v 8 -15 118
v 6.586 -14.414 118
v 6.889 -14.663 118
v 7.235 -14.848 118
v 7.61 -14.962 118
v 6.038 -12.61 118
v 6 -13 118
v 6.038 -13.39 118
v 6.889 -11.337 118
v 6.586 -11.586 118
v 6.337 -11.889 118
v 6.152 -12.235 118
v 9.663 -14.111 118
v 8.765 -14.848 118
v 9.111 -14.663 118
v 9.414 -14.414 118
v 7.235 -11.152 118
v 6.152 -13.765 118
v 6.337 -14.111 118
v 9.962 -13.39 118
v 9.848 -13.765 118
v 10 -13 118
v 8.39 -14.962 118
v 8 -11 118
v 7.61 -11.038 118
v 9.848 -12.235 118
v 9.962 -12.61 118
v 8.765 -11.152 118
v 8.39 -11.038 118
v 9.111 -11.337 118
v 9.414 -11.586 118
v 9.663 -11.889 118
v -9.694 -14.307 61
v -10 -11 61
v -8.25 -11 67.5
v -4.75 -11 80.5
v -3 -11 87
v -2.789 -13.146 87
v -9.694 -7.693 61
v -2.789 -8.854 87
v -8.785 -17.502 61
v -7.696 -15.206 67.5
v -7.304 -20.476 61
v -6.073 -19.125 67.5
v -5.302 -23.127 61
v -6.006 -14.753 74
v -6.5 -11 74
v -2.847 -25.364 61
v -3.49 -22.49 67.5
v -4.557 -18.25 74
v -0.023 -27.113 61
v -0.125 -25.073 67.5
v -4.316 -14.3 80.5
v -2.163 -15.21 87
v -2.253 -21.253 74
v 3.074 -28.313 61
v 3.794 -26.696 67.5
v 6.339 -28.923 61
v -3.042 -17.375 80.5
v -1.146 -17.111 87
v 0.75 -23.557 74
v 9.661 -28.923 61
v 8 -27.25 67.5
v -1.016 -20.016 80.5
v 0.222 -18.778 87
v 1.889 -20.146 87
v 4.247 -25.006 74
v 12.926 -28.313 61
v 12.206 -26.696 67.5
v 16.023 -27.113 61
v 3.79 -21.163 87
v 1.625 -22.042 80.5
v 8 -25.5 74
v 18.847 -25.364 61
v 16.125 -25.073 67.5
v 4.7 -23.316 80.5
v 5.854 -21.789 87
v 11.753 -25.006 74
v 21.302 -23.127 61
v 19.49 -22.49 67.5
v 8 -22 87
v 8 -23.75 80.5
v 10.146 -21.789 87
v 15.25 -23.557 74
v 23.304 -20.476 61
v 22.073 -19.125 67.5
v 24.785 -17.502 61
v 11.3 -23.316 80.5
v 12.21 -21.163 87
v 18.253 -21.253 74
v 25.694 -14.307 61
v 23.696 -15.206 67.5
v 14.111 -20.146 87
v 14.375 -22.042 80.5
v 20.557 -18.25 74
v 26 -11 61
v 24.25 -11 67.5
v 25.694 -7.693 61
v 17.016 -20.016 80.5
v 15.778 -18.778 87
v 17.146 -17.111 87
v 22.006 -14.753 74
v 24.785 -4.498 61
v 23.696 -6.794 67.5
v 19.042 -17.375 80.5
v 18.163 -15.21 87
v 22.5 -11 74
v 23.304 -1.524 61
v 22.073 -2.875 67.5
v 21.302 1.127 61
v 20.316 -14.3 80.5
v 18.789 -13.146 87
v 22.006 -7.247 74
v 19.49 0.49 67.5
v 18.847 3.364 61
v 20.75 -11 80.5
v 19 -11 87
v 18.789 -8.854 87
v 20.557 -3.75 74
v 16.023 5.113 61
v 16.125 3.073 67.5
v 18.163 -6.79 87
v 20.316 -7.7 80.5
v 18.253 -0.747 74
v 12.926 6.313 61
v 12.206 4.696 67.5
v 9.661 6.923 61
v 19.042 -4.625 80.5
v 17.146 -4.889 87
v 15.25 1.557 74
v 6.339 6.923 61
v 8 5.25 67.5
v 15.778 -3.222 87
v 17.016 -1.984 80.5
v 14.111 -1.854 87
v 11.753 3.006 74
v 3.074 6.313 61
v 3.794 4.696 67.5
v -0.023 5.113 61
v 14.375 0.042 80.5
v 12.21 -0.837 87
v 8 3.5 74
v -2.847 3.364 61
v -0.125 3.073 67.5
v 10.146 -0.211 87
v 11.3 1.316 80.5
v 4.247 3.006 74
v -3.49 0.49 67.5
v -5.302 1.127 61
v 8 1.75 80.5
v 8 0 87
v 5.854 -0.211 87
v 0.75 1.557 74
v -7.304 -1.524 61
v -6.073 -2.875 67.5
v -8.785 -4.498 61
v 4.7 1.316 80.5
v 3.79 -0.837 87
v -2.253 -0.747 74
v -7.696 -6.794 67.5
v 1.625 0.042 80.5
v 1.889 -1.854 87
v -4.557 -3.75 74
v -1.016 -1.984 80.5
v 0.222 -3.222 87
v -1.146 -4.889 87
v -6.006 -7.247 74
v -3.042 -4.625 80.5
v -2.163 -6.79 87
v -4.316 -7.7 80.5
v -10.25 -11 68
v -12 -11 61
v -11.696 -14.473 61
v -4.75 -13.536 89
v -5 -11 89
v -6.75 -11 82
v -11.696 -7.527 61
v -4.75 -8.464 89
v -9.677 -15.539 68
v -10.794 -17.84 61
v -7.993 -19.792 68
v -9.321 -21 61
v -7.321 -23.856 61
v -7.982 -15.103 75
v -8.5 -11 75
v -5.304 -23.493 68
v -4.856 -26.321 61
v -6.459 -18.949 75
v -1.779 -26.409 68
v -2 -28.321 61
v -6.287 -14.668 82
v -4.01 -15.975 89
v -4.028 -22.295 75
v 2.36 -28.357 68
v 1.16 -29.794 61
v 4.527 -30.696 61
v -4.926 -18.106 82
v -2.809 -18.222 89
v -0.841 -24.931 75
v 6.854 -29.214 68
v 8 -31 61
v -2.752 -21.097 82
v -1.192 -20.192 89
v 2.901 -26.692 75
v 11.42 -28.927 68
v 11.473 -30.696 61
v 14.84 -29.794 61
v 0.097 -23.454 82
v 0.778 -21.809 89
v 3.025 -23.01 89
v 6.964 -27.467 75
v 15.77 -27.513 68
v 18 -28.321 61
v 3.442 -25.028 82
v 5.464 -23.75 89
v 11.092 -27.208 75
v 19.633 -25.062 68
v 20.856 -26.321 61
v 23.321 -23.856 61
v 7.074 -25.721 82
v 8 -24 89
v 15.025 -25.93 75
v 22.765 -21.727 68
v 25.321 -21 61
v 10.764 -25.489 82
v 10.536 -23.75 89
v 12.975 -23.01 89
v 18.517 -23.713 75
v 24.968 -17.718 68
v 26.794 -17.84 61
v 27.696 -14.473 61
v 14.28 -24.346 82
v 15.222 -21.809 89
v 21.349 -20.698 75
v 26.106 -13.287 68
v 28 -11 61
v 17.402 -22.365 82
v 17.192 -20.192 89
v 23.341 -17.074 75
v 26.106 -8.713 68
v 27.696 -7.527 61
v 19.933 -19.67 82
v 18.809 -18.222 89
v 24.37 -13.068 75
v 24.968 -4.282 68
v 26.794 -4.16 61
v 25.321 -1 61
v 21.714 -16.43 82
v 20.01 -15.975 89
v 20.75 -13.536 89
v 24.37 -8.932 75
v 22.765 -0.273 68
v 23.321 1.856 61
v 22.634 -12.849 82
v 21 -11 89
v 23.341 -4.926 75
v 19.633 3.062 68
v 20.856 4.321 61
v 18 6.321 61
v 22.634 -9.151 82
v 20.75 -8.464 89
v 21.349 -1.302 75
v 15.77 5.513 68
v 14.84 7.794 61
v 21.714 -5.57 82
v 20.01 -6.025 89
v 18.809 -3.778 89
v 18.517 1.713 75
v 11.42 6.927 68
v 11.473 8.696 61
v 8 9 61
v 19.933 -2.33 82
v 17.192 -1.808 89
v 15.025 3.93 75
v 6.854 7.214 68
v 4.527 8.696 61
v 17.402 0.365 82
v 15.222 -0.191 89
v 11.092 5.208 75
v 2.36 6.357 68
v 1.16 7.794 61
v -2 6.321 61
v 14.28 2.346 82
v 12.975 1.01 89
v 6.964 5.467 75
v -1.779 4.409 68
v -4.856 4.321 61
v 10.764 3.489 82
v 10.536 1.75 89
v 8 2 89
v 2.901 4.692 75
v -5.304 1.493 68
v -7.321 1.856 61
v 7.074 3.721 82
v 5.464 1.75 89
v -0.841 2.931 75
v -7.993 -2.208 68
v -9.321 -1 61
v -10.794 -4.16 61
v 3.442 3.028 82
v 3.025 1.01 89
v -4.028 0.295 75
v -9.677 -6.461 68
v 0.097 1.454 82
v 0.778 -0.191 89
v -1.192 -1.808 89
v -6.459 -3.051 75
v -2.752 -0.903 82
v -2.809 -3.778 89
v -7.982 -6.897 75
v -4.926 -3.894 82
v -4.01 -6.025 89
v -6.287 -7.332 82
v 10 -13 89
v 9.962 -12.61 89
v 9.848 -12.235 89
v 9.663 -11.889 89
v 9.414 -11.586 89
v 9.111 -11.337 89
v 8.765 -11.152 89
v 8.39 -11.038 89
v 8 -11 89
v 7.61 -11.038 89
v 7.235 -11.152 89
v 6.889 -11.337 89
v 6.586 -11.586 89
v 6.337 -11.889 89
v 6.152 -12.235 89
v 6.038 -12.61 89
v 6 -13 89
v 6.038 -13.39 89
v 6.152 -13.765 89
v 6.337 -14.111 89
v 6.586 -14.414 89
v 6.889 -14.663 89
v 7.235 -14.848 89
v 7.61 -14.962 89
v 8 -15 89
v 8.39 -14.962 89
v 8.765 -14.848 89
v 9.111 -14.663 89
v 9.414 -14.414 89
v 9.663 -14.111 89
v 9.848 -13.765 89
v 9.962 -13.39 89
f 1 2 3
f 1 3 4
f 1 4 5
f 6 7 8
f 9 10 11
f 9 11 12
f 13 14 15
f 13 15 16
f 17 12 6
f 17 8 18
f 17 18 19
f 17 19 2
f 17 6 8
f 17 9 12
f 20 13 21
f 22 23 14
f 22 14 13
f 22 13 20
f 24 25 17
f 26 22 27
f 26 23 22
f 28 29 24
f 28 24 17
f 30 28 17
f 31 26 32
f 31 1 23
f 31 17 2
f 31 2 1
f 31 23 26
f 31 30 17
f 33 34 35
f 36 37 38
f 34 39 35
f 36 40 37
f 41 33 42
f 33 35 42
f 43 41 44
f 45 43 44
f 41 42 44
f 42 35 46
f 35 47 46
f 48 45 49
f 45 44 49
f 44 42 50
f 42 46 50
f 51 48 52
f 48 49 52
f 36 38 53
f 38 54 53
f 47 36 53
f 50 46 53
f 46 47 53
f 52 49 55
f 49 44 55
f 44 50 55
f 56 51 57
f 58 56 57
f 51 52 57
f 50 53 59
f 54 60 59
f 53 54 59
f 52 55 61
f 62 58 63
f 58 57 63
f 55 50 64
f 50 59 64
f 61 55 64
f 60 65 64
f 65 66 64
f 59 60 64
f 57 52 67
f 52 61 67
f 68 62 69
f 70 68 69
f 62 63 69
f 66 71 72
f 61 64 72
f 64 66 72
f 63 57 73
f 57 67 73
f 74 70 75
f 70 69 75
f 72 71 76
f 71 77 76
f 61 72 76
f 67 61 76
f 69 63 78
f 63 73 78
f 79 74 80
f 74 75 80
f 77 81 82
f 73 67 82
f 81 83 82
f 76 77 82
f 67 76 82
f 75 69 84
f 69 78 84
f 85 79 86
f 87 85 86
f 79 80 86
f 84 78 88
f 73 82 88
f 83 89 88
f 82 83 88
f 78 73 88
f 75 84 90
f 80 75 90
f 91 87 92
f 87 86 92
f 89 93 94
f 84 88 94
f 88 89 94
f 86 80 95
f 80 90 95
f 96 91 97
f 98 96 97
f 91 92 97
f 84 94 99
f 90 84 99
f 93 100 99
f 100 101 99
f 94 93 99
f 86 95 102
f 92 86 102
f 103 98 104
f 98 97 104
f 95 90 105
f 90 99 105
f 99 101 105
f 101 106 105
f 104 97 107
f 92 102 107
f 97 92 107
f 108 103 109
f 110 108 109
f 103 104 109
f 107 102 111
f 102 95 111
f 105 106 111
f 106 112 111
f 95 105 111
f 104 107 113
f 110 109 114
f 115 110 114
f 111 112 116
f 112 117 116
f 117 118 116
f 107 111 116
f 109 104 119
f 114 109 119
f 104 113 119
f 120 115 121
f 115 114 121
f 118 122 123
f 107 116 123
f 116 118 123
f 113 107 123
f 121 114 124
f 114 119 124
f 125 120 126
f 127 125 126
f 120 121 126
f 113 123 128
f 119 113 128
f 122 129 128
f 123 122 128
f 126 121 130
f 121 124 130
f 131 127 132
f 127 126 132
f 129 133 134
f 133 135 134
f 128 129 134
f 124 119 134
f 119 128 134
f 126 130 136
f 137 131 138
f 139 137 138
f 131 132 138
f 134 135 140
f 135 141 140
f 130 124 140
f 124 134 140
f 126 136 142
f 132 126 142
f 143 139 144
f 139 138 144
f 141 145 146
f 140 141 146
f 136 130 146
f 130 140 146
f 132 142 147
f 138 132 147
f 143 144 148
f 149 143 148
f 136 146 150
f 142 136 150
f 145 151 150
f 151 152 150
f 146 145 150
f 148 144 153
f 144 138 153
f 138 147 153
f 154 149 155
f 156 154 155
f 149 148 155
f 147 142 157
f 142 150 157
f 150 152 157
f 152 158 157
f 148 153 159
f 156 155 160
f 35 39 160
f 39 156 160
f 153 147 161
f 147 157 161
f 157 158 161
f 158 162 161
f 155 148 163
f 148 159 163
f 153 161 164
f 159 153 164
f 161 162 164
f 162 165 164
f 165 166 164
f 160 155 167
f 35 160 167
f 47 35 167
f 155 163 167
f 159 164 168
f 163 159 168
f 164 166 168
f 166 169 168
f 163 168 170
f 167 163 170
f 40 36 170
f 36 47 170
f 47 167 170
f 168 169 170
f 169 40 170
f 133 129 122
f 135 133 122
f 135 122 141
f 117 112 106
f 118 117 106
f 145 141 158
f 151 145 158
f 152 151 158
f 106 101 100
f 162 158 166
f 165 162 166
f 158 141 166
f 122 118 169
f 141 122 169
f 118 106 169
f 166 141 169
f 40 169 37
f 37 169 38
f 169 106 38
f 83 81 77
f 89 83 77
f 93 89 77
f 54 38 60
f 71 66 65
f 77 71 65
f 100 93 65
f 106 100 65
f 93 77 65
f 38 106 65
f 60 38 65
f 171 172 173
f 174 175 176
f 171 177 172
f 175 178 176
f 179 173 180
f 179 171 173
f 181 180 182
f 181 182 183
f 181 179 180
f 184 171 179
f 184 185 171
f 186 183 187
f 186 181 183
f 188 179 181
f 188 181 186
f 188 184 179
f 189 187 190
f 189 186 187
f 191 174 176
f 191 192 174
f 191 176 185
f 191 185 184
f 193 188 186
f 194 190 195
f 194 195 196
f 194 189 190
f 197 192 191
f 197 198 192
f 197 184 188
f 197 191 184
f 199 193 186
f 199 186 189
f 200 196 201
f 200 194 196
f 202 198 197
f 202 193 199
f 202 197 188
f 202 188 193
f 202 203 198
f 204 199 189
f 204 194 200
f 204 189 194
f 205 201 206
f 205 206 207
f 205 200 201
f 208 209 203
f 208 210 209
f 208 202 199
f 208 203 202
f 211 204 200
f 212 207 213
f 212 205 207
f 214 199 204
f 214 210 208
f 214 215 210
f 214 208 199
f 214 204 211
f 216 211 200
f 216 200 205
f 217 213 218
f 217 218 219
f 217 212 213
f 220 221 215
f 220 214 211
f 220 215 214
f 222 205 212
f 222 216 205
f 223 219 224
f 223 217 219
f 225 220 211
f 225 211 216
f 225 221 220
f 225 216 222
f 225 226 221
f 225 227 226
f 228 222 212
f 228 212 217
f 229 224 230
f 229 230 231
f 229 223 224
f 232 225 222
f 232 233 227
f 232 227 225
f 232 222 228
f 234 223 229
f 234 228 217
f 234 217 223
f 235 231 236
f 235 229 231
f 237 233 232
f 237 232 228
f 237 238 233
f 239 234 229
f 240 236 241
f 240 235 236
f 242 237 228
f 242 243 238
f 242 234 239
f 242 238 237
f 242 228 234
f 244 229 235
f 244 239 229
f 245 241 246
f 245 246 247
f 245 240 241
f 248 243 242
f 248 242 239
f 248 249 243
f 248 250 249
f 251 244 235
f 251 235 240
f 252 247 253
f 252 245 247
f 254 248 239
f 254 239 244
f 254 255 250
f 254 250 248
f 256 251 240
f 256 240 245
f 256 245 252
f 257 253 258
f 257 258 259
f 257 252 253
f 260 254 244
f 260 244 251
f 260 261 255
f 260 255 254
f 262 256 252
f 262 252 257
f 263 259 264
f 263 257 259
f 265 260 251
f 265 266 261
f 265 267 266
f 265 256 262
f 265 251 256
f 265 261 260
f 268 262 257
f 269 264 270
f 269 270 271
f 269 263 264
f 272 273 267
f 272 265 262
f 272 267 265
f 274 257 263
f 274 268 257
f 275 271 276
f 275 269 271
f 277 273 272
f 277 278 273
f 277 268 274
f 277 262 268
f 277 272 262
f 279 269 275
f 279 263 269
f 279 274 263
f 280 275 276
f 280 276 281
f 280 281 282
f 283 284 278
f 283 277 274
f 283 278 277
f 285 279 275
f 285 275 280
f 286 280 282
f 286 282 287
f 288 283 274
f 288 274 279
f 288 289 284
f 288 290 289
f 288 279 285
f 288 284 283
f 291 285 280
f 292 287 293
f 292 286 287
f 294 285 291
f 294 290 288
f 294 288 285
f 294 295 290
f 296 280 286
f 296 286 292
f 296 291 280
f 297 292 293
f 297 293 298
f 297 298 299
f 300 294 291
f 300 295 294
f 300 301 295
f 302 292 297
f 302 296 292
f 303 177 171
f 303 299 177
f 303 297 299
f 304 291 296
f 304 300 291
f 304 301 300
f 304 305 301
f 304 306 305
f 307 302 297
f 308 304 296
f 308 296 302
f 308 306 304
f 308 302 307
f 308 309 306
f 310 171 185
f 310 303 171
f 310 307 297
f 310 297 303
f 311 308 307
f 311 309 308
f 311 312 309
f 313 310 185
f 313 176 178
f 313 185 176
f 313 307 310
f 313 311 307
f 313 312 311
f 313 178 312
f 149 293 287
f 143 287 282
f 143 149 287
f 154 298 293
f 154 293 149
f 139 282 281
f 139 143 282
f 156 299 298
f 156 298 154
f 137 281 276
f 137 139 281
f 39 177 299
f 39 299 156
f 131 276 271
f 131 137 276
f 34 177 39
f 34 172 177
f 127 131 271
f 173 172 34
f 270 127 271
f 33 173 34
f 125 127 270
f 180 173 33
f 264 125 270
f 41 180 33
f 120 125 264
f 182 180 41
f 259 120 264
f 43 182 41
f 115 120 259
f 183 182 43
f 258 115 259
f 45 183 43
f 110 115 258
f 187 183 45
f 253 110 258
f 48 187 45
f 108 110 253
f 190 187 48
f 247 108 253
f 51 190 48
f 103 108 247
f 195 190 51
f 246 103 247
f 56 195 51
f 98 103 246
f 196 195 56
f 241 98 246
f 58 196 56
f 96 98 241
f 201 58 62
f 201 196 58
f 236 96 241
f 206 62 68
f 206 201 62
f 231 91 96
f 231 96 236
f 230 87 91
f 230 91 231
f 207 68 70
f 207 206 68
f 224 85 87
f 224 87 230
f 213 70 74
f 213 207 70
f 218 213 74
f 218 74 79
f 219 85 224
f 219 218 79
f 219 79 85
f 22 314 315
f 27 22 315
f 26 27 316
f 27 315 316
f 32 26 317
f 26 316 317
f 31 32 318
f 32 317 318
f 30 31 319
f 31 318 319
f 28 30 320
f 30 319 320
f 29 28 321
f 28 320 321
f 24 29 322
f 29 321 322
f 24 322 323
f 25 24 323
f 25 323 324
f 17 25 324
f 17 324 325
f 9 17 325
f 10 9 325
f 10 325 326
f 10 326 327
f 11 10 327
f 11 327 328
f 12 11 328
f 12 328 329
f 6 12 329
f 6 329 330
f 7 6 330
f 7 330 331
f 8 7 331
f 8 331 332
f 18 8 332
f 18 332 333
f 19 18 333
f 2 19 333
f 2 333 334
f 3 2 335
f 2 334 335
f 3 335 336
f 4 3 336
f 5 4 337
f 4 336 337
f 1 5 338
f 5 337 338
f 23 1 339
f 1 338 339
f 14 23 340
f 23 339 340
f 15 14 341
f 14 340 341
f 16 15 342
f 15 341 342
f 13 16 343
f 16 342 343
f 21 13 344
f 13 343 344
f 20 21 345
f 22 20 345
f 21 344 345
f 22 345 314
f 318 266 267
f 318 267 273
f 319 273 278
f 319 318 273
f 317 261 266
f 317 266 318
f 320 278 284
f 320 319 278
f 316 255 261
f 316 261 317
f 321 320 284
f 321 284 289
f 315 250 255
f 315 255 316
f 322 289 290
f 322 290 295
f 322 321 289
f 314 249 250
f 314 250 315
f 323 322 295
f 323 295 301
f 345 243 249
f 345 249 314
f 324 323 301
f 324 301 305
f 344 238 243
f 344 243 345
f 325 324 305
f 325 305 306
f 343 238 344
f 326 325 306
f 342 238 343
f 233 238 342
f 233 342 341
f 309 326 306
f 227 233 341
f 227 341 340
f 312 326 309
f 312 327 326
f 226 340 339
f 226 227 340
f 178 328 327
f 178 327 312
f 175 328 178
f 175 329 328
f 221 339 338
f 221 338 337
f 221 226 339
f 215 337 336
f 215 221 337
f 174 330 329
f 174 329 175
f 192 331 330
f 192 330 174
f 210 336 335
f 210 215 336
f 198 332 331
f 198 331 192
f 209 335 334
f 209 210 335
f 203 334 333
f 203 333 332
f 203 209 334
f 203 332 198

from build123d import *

# Parameters (mm, degrees)
CYLINDER086_R     = 2
CYLINDER086_DEPTH = 30


with BuildPart() as cylindre082:
    # Cylinder086 → Cylinder086 (new body)
    with BuildSketch(Plane(origin=(8, -13, 88), x_dir=(1, 0, 0), z_dir=(0, 0, 1))):
        Circle(CYLINDER086_R)
    extrude(amount=CYLINDER086_DEPTH)


with BuildPart() as c_ne017:
    # Cone017 → Cone017 (revolve)
    with BuildSketch(Plane(origin=(8, -11, 73), x_dir=(-1, 0, 0), z_dir=(0, 1, 0))):
        Polygon((0, 0), (18, 0), (11, 26), (0, 26), align=None)
    revolve(axis=Axis((8, -11, 73), (0, 0, 1)))


with BuildPart() as fusion047:
    # Cone018 → Cone018 (revolve)
    with BuildSketch(Plane(origin=(8, -11, 73), x_dir=(-1, 0, 0), z_dir=(0, 1, 0))):
        Polygon((0, 0), (20, 0), (13, 28), (0, 28), align=None)
    revolve(axis=Axis((8, -11, 73), (0, 0, 1)))

    # Cut044: cut Cône017
    add(c_ne017.part, mode=Mode.SUBTRACT)


with BuildPart() as fusion047_1:
    # Cut044 placement: moved
    add(fusion047.part.moved(Location((0, 0, -12))))

    # Fusion047: union Cylindre082
    add(cylindre082.part)


solid = fusion047_1.part
